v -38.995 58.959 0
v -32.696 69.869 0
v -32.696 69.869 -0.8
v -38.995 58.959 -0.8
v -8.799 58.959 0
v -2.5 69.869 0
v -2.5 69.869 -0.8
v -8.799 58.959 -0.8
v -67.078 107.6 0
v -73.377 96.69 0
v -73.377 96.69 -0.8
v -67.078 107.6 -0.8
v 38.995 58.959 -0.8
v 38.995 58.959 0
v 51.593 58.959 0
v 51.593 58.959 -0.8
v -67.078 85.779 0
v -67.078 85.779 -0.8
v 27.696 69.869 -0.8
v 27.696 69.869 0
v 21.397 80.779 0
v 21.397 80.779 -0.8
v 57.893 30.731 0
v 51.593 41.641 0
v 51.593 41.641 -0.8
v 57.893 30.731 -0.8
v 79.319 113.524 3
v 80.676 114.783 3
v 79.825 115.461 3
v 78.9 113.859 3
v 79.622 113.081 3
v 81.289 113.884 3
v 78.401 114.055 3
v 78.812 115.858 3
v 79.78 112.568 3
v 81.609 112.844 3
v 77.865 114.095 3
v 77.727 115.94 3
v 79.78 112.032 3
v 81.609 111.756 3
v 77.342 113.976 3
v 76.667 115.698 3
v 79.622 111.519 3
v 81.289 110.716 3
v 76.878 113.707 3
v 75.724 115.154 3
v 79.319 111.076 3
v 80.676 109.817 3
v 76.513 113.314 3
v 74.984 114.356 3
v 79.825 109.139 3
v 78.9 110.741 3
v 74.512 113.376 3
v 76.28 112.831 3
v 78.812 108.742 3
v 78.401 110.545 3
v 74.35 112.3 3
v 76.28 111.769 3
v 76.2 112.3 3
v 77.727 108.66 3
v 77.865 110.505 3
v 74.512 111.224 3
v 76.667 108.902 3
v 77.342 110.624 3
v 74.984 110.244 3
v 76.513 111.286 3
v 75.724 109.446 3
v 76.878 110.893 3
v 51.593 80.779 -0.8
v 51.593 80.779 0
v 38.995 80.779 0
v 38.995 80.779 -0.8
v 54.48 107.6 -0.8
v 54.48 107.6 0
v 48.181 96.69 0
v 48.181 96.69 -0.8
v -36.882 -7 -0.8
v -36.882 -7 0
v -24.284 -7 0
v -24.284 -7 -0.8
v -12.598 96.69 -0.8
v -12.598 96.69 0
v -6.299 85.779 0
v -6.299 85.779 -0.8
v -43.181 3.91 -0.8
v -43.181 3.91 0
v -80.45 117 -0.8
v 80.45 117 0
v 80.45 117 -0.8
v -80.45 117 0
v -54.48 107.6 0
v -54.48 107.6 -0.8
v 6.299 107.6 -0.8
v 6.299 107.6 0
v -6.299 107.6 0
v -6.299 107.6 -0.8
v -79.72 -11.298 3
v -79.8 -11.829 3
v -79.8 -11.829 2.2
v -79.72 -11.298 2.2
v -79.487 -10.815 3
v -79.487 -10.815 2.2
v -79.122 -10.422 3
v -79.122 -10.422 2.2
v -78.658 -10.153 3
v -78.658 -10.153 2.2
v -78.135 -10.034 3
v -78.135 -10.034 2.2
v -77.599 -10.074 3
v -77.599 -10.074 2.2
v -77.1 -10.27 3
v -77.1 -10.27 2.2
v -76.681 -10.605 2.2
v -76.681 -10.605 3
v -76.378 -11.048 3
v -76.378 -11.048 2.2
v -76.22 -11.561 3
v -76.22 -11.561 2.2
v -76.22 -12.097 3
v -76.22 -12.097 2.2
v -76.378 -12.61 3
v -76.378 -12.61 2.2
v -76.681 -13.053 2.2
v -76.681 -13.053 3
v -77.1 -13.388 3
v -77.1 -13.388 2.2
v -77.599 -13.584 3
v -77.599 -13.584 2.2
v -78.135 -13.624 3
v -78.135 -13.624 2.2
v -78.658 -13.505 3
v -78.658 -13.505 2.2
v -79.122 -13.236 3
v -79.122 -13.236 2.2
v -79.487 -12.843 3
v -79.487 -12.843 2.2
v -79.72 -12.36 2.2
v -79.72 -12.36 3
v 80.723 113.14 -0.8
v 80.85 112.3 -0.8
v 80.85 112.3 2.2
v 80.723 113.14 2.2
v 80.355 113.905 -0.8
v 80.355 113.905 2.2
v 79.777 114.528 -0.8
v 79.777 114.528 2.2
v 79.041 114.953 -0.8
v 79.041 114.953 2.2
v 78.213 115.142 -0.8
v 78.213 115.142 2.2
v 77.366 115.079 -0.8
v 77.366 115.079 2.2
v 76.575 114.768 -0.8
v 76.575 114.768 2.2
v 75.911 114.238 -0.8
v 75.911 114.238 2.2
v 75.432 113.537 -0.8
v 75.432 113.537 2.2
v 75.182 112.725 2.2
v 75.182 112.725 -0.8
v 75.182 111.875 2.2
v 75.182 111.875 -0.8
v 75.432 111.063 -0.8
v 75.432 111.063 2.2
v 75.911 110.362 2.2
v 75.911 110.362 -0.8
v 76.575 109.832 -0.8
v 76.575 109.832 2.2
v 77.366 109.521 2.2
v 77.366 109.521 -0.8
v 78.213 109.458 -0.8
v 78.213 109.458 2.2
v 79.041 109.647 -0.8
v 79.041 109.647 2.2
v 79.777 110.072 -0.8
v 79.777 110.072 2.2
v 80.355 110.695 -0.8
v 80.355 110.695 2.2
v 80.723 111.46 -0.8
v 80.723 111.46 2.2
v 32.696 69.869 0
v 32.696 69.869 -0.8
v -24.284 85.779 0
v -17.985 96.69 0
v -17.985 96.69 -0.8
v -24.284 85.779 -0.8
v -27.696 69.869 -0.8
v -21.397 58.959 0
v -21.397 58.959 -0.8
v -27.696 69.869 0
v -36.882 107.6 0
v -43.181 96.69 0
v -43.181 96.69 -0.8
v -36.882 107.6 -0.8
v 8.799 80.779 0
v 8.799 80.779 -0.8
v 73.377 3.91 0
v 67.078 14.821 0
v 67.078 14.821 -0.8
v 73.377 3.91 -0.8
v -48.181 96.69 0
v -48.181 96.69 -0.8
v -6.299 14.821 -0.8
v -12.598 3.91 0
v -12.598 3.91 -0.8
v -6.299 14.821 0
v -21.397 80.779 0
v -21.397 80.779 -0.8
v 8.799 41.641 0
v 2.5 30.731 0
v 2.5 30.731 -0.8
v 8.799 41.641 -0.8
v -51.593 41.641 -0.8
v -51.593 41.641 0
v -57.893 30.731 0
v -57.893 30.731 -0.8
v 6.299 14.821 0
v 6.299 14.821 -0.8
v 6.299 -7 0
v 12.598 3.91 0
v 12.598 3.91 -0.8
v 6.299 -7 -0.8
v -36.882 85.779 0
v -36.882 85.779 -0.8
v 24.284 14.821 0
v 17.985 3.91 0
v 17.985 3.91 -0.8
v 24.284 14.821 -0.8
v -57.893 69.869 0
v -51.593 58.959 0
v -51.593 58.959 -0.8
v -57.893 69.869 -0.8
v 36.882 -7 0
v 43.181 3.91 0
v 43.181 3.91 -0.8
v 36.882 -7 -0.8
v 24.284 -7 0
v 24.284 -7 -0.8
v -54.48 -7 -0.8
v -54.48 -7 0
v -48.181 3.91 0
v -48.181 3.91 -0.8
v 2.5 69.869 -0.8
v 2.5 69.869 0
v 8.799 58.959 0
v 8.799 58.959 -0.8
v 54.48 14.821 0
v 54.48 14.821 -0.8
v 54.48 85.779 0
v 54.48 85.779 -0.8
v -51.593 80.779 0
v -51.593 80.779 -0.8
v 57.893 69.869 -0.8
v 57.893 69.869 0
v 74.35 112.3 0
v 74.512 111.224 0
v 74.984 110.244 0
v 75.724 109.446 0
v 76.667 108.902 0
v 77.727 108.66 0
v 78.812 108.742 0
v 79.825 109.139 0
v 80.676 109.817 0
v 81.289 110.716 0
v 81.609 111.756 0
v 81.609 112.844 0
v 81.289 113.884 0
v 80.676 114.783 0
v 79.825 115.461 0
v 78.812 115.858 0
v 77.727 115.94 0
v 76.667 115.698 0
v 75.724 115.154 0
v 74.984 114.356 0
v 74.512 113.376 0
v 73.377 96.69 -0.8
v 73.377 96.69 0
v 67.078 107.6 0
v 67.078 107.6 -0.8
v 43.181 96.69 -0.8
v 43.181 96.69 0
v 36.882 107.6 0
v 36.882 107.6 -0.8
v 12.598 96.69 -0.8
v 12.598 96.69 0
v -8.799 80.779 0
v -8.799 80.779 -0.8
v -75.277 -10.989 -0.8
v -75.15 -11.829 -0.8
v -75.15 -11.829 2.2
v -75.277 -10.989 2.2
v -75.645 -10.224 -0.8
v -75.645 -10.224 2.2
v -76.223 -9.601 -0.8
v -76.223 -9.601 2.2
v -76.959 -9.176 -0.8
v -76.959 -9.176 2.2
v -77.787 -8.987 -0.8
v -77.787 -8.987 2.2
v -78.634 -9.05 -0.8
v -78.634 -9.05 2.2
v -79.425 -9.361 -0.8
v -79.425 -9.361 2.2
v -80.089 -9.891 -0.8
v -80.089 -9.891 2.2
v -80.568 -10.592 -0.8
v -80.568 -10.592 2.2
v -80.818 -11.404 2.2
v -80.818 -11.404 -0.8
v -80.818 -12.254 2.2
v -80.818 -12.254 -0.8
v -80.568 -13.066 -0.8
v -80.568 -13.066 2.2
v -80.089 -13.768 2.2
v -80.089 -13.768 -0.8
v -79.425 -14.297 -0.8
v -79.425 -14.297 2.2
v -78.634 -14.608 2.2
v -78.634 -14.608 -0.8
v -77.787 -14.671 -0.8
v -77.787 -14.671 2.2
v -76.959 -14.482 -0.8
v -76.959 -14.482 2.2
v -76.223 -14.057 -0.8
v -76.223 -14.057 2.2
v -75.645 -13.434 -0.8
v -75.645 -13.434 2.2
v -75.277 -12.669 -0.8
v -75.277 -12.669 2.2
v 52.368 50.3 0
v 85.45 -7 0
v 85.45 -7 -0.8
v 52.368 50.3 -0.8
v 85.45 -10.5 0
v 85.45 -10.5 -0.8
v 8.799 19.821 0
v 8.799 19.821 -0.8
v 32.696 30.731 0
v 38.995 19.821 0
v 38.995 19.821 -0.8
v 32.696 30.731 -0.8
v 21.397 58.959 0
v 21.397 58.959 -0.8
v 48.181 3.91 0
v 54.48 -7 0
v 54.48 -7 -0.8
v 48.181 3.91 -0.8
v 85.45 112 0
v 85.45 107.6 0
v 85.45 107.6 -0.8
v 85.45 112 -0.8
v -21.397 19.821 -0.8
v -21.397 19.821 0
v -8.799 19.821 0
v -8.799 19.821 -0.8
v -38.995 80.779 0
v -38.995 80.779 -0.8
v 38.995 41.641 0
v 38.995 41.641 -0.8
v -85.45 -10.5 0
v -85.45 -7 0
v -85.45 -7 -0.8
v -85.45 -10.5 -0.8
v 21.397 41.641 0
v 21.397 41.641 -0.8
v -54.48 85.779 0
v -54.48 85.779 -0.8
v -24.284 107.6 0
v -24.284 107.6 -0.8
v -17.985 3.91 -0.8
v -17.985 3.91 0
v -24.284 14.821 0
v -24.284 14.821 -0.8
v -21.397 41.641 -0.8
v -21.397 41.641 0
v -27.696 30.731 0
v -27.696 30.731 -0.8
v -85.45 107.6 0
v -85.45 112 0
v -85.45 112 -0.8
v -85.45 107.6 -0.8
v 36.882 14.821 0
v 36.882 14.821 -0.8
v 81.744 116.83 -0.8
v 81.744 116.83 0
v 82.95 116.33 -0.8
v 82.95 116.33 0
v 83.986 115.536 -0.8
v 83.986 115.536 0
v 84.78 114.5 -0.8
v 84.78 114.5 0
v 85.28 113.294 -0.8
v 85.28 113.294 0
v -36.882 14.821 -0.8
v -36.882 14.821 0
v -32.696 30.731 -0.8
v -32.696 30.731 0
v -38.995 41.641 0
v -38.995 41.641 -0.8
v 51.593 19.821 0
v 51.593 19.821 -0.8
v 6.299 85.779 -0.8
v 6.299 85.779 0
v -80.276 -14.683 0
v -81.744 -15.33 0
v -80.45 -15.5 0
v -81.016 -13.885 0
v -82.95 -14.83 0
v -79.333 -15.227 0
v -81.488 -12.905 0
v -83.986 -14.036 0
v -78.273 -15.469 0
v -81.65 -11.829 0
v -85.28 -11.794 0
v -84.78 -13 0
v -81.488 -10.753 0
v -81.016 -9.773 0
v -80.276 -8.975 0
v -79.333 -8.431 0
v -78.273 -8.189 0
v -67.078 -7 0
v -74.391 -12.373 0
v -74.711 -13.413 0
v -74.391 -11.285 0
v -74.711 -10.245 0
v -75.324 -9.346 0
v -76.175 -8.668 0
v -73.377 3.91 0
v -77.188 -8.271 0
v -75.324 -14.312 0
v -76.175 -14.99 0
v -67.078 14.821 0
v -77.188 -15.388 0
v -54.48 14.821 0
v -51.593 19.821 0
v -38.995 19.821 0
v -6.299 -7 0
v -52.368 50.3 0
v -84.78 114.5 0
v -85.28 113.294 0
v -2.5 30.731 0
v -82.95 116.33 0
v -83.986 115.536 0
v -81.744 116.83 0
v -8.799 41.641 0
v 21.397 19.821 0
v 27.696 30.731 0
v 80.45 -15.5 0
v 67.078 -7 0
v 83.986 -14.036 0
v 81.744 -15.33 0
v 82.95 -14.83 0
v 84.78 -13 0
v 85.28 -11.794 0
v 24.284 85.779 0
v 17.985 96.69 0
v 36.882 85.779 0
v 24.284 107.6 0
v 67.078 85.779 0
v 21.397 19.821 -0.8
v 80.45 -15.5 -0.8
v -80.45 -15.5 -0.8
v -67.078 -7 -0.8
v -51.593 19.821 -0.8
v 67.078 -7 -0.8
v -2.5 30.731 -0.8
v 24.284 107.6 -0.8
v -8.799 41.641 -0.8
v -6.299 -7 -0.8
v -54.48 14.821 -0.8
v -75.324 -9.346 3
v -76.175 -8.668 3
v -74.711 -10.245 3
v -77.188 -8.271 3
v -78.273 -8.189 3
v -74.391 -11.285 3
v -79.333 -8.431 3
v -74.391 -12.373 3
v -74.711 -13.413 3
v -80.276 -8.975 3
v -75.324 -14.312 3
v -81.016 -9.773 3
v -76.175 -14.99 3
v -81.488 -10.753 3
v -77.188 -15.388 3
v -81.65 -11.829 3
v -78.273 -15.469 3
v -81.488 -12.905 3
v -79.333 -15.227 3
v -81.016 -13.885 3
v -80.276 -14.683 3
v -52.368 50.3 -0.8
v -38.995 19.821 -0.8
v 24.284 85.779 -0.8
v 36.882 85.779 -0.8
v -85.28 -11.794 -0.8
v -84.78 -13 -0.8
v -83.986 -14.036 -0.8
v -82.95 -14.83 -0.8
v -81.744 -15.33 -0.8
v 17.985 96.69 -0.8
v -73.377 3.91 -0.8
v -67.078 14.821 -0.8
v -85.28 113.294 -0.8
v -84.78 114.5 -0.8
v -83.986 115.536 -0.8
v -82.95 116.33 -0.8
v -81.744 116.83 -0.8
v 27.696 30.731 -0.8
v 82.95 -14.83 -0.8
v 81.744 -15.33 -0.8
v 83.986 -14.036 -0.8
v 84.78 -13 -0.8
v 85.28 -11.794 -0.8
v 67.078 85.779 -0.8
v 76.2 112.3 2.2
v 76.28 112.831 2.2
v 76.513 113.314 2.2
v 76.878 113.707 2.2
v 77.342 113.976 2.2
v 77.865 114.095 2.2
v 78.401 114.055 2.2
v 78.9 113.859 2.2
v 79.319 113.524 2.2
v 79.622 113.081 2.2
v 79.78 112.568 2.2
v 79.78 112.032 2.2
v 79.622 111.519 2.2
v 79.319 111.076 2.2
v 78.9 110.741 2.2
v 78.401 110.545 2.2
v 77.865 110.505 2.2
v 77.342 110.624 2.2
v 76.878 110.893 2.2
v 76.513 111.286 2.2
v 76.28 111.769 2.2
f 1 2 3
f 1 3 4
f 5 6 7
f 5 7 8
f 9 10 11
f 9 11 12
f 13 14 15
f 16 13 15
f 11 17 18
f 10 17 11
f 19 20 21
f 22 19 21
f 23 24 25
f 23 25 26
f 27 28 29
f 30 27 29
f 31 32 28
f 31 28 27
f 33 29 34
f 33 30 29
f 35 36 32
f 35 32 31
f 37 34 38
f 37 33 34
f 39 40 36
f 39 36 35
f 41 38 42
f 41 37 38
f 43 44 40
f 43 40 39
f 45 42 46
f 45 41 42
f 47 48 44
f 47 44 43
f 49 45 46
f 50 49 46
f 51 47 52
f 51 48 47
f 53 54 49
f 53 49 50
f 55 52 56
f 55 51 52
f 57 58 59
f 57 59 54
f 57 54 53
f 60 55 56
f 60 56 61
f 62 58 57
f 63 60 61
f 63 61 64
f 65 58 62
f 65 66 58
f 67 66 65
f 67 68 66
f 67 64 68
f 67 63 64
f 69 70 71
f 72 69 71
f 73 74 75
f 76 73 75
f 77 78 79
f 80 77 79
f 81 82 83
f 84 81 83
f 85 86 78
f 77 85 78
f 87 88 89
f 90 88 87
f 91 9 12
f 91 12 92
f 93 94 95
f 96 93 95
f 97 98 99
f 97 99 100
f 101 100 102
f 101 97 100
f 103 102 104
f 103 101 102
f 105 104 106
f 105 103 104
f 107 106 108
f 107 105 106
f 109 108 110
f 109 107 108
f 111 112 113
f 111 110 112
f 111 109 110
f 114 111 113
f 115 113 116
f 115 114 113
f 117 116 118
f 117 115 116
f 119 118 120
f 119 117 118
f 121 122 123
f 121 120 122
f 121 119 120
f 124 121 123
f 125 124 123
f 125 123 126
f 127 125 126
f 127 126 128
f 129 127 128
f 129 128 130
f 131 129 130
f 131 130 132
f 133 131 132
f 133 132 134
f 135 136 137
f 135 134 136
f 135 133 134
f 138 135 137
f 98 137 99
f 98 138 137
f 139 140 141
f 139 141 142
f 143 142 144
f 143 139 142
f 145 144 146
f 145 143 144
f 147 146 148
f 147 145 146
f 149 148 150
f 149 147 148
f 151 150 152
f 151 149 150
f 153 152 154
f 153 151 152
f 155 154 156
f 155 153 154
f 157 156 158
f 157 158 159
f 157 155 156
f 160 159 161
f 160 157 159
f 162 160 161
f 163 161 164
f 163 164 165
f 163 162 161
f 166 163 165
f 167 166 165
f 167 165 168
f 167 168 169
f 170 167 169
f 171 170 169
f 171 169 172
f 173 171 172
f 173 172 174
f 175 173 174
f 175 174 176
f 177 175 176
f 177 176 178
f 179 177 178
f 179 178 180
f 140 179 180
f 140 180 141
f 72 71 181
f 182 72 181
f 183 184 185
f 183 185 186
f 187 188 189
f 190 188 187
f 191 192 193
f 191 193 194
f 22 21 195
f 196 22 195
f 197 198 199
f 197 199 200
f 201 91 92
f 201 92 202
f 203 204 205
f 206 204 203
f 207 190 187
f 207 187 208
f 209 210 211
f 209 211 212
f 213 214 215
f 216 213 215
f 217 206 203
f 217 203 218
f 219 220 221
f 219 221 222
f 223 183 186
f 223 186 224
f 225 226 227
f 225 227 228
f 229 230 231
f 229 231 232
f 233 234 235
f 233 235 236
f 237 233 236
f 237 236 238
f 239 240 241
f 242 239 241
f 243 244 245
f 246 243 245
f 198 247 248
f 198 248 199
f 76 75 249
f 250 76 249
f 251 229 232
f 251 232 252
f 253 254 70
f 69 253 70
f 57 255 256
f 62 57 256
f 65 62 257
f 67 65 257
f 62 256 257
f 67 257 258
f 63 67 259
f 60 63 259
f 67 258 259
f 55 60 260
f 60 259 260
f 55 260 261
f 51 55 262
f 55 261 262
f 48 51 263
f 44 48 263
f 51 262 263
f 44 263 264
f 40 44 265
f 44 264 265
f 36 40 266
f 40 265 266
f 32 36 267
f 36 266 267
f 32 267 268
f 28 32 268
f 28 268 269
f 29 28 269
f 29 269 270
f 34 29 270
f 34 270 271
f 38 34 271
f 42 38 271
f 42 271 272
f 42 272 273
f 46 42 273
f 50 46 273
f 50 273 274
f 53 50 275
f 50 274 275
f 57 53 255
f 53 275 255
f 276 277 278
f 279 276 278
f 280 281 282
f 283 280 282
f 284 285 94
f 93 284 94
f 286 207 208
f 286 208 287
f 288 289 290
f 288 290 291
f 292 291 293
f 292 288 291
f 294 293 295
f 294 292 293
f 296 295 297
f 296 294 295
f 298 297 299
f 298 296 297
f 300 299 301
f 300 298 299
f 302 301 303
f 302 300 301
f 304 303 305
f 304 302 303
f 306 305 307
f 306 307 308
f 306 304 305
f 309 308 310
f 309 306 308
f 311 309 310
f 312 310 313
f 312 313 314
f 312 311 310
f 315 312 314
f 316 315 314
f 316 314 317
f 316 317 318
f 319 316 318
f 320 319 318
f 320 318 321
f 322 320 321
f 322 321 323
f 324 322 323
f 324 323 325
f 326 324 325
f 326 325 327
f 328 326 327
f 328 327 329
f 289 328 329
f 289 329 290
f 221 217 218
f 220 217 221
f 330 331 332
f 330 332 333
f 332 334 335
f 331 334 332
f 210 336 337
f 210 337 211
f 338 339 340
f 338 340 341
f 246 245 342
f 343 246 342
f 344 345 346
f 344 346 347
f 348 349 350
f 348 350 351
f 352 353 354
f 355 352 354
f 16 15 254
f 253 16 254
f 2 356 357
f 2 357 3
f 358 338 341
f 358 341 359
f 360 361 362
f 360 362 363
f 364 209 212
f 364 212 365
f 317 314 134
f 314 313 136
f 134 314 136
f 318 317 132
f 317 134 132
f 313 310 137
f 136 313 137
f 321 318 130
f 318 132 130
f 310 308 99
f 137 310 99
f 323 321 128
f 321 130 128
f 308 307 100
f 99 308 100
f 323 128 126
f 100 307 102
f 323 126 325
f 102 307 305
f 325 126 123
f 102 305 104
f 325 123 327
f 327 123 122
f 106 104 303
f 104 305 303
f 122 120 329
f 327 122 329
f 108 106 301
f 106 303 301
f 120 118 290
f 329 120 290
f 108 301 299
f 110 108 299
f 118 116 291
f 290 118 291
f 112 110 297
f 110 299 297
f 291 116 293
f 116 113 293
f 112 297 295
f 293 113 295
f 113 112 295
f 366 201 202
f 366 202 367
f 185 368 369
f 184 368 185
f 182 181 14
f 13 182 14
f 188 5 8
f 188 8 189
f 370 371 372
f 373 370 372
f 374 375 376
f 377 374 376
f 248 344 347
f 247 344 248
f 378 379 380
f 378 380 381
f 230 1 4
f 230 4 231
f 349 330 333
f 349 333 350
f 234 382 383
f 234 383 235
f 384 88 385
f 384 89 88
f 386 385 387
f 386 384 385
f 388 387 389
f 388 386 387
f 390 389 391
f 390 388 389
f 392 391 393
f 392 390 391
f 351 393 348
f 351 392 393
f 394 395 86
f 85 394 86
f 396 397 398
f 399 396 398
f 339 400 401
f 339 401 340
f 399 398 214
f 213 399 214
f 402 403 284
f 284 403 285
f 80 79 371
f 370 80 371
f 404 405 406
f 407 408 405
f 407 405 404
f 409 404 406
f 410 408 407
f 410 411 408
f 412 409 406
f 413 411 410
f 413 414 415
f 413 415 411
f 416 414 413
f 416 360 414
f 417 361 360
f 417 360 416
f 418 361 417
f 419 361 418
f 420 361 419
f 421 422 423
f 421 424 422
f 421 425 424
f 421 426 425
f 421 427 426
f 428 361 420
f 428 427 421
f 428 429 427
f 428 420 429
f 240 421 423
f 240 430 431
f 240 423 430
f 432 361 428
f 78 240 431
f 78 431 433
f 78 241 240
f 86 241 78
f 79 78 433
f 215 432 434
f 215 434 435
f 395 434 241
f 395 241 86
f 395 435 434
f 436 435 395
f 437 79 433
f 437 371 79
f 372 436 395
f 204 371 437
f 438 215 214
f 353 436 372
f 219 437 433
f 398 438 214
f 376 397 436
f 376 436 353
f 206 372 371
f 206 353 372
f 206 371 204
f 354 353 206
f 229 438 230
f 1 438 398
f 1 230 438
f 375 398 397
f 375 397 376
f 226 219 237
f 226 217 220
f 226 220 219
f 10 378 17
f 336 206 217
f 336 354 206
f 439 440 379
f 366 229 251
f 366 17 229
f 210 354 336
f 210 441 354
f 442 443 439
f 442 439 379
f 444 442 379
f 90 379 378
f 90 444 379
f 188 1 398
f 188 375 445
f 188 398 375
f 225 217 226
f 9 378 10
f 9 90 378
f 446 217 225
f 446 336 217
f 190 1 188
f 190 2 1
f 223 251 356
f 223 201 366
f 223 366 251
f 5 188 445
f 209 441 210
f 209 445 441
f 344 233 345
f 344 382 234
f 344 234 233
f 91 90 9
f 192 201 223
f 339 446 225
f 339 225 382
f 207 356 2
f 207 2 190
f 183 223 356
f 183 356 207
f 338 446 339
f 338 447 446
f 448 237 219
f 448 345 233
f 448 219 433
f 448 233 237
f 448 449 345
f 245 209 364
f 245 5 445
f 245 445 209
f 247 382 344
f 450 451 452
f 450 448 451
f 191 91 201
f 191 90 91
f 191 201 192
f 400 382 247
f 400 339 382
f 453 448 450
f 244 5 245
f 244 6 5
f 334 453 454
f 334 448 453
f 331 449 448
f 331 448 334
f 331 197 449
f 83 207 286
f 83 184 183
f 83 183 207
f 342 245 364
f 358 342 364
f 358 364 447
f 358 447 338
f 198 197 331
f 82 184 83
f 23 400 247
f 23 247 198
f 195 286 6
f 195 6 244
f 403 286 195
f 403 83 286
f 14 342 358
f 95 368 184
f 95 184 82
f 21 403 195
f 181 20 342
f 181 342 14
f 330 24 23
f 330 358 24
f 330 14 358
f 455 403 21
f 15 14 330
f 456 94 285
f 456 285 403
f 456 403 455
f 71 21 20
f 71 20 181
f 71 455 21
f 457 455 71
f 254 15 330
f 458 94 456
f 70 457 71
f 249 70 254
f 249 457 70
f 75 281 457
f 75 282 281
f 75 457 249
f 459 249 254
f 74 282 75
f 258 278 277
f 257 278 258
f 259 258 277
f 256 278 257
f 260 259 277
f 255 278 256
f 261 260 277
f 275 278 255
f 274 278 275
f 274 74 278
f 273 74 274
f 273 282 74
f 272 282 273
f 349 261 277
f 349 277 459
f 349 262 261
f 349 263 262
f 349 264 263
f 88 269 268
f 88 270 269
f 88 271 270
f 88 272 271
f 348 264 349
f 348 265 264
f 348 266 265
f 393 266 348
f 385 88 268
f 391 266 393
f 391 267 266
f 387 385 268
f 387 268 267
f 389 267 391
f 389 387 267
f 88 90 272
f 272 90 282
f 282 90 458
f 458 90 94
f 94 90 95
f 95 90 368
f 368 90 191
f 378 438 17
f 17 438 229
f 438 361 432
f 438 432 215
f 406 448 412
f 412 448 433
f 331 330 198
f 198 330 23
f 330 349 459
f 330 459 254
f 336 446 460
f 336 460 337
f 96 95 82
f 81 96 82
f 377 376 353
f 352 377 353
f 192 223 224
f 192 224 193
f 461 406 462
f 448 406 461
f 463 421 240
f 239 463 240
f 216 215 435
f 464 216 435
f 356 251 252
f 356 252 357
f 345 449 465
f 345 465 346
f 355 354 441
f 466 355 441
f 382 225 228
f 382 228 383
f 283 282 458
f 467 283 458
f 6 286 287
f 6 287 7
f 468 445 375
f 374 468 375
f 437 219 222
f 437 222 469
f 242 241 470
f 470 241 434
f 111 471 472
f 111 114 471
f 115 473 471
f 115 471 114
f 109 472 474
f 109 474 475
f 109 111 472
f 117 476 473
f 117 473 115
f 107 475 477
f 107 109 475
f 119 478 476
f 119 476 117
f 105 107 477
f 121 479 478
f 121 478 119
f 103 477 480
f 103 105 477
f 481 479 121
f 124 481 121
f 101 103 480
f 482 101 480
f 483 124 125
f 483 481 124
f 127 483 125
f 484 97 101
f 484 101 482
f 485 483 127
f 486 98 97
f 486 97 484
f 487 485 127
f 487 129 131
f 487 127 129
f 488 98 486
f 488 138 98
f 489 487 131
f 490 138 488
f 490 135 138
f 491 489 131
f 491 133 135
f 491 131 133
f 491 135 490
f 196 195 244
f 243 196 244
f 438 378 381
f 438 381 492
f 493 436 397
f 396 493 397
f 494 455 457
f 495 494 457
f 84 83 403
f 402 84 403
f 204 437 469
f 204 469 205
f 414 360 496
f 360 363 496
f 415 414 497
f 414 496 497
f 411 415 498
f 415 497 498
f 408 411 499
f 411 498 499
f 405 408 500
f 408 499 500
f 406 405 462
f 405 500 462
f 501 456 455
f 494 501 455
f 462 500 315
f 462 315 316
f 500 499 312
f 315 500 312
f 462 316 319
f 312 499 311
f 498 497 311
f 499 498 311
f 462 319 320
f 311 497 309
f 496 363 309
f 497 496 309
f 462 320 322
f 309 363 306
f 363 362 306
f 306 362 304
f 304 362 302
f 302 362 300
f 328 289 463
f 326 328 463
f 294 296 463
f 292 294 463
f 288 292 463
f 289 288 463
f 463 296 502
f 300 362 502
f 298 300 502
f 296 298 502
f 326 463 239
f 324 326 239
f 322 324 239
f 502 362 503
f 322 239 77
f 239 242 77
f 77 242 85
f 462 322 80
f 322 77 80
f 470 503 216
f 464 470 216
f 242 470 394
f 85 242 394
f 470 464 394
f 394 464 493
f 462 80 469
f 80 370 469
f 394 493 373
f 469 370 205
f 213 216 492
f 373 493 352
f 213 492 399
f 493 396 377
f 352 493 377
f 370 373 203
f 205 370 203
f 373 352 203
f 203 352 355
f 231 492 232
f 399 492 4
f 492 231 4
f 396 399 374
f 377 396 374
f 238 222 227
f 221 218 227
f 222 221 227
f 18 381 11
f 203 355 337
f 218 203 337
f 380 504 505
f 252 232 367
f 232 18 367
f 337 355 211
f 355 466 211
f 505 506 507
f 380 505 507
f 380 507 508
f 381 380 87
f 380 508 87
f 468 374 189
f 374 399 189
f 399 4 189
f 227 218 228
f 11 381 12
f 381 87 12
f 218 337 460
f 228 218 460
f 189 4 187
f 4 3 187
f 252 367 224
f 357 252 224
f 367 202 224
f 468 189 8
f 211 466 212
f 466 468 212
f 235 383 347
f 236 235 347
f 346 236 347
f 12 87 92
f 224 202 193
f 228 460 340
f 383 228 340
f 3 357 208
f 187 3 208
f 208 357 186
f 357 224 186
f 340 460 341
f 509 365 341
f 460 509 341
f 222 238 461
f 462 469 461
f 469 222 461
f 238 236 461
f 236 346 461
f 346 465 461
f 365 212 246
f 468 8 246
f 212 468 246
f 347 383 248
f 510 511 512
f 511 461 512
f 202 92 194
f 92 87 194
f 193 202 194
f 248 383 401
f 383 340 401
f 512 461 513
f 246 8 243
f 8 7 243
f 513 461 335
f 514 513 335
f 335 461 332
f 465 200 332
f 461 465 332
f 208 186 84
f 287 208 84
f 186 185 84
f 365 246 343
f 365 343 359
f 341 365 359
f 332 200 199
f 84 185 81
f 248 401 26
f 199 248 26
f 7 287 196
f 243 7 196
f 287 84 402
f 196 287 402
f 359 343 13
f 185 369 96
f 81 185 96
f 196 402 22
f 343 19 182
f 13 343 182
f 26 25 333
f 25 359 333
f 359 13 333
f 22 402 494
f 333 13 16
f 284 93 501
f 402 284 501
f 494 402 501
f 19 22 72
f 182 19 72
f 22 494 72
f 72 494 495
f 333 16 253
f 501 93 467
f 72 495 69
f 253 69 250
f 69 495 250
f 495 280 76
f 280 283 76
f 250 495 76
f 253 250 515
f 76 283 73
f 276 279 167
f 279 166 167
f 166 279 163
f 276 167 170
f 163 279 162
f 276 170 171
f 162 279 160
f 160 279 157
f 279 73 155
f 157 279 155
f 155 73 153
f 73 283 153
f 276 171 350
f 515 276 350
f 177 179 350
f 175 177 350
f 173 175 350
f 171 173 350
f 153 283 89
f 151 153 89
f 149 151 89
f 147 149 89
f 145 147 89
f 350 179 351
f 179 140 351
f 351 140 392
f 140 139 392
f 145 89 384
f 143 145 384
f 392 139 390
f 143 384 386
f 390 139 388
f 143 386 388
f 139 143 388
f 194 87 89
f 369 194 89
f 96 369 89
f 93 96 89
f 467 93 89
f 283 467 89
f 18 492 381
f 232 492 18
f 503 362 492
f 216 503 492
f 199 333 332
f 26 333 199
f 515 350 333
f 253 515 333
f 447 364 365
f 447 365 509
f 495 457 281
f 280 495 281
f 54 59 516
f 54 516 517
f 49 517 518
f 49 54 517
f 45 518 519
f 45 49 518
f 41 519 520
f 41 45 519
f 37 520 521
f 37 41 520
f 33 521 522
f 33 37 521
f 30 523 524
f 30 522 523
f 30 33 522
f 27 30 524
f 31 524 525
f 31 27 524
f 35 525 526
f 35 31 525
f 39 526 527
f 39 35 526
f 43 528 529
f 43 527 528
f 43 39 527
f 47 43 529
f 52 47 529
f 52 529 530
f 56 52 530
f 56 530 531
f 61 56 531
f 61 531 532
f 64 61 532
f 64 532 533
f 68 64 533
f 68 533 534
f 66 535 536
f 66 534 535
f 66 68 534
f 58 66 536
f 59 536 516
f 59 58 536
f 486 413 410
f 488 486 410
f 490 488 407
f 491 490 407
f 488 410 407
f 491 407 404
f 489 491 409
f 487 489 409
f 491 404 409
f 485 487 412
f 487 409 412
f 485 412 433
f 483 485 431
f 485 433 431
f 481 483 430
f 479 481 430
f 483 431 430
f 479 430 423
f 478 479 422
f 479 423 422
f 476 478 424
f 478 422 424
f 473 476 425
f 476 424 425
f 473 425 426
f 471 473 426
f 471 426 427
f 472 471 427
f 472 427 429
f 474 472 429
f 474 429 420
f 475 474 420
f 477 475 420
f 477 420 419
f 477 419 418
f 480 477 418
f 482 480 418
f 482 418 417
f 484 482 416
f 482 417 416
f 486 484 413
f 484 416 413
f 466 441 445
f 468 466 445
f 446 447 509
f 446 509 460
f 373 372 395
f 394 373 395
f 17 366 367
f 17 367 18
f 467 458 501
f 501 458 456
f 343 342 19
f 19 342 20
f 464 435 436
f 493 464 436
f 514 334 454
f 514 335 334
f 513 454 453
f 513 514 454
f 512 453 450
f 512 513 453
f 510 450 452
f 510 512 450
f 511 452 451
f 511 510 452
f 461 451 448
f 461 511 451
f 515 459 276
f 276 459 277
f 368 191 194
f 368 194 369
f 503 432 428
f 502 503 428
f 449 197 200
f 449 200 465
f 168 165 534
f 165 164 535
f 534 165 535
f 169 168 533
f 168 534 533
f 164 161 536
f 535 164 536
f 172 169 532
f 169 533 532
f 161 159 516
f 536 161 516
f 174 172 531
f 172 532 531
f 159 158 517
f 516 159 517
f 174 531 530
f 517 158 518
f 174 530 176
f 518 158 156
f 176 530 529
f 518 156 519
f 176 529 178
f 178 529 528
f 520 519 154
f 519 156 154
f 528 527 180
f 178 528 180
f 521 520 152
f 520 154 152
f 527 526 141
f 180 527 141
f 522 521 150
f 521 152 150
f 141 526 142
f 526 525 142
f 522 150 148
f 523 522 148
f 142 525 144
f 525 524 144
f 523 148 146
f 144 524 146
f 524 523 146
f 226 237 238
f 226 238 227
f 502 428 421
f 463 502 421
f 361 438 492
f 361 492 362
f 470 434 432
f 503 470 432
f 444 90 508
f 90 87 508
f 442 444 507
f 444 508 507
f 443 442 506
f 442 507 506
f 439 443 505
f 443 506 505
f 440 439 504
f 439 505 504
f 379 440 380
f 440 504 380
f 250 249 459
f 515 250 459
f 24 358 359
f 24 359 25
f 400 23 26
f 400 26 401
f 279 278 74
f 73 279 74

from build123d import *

# Parameters (mm, degrees)
BOSS_EXTRUDE1_DEPTH     = 0.8
CUT_EXTRUDE1_DEPTH      = 145.88389317
CUT_EXTRUDE2_DEPTH      = 145.88389317
MIRROR2_COPY_1_DEPTH    = 145.88389317
MIRROR2_COPY_2_DEPTH    = 145.88389317
FILLET1_R               = 5
SKETCH4_R               = 3.65
BOSS_EXTRUDE4_DEPTH     = 3
CUT_EXTRUDE5_DEPTH      = 145.931509686
CUT_EXTRUDE5_DEPTH_BACK = 145.931509686
SKETCH2_4_R             = 1.8
CUT_EXTRUDE6_DEPTH      = 2.2
CUT_EXTRUDE6_DEPTH_BACK = 145.912740986
SKETCH4_4_R             = 2.85


with BuildPart() as part:
    # Sketch1 → Boss-Extrude1 (new body)
    with BuildSketch(Plane.XY):
        Polygon((85.45, 117), (-85.45, 117), (-85.45, 107.6), (-52.367829575, 50.3), (-85.45, -7), (-85.45, -15.5), (85.45, -15.5), (85.45, -7), (52.367829575, 50.3), (85.45, 107.6), align=None)
    extrude(amount=-BOSS_EXTRUDE1_DEPTH)

    # Sketch1<3> → Cut-Extrude1 (cut, through all)
    with BuildSketch(Plane.XY):
        Polygon((73.377429493, 96.689694505), (67.078361679, 107.6), (54.480226049, 107.6), (48.181158234, 96.689694505), (54.480226049, 85.779389009), (67.078361679, 85.779389009), align=None)
        Polygon((51.593474703, 80.779389009), (38.995339074, 80.779389009), (32.696271259, 69.869083514), (38.995339074, 58.958778018), (51.593474703, 58.958778018), (57.892542518, 69.869083514), align=None)
        Polygon((43.181158234, 96.689694505), (36.88209042, 107.6), (24.28395479, 107.6), (17.984886975, 96.689694505), (24.28395479, 85.779389009), (36.88209042, 85.779389009), align=None)
        Polygon((21.397203444, 80.779389009), (8.799067815, 80.779389009), (2.5, 69.869083514), (8.799067815, 58.958778018), (21.397203444, 58.958778018), (27.696271259, 69.869083514), align=None)
    cut_extrude1 = extrude(amount=-CUT_EXTRUDE1_DEPTH, mode=Mode.SUBTRACT)

    # Sketch1<4> → Cut-Extrude2 (cut, through all)
    with BuildSketch(Plane.XY):
        Polygon((-6.299067815, 107.6), (-12.598135629, 96.689694505), (-6.299067815, 85.779389009), (6.299067815, 85.779389009), (12.598135629, 96.689694505), (6.299067815, 107.6), align=None)
    cut_extrude2 = extrude(amount=-CUT_EXTRUDE2_DEPTH, mode=Mode.SUBTRACT)

    # Mirror1: Cut-Extrude1 across plane
    add(cut_extrude1.mirror(Plane(origin=(0, 0, 0), x_dir=(0, 0, 1), z_dir=(1, 0, 0))), mode=Mode.SUBTRACT)

    # Mirror2: Cut-Extrude2 across plane
    add(cut_extrude2.mirror(Plane(origin=(0, 50.3, 0), x_dir=(0, 0, 1), z_dir=(0, -1, 0))), mode=Mode.SUBTRACT)

    # Mirror2 copy 1 sketch → Mirror2 copy 1 (cut, through all)
    with BuildSketch(Plane(origin=(0, 100.6, 0), x_dir=(-1, 0, 0), z_dir=(0, 0, 1))):
        Polygon((73.377429493, 96.689694505), (67.078361679, 107.6), (54.480226049, 107.6), (48.181158234, 96.689694505), (54.480226049, 85.779389009), (67.078361679, 85.779389009), align=None)
        Polygon((51.593474703, 80.779389009), (38.995339074, 80.779389009), (32.696271259, 69.869083514), (38.995339074, 58.958778018), (51.593474703, 58.958778018), (57.892542518, 69.869083514), align=None)
        Polygon((43.181158234, 96.689694505), (36.88209042, 107.6), (24.28395479, 107.6), (17.984886975, 96.689694505), (24.28395479, 85.779389009), (36.88209042, 85.779389009), align=None)
        Polygon((21.397203444, 80.779389009), (8.799067815, 80.779389009), (2.5, 69.869083514), (8.799067815, 58.958778018), (21.397203444, 58.958778018), (27.696271259, 69.869083514), align=None)
    extrude(amount=-MIRROR2_COPY_1_DEPTH, mode=Mode.SUBTRACT)

    # Mirror2 copy 2 sketch → Mirror2 copy 2 (cut, through all)
    with BuildSketch(Plane(origin=(0, 100.6, 0), x_dir=(1, 0, 0), z_dir=(0, 0, 1))):
        Polygon((73.377429493, -96.689694505), (67.078361679, -107.6), (54.480226049, -107.6), (48.181158234, -96.689694505), (54.480226049, -85.779389009), (67.078361679, -85.779389009), align=None)
        Polygon((51.593474703, -80.779389009), (38.995339074, -80.779389009), (32.696271259, -69.869083514), (38.995339074, -58.958778018), (51.593474703, -58.958778018), (57.892542518, -69.869083514), align=None)
        Polygon((43.181158234, -96.689694505), (36.88209042, -107.6), (24.28395479, -107.6), (17.984886975, -96.689694505), (24.28395479, -85.779389009), (36.88209042, -85.779389009), align=None)
        Polygon((21.397203444, -80.779389009), (8.799067815, -80.779389009), (2.5, -69.869083514), (8.799067815, -58.958778018), (21.397203444, -58.958778018), (27.696271259, -69.869083514), align=None)
    extrude(amount=-MIRROR2_COPY_2_DEPTH, mode=Mode.SUBTRACT)

    # Fillet1
    fillet1_edges = [part.edges().sort_by_distance(p)[0] for p in [
        (85.45, -15.5, -0.4),
        (-85.45, -15.5, -0.4),
        (-85.45, 117, -0.4),
        (85.45, 117, -0.4),
    ]]
    fillet(fillet1_edges, radius=FILLET1_R)

    # Sketch4 → Boss-Extrude4 (add)
    with BuildSketch(Plane.XY):
        with Locations((-78, -11.829016319)):
            Circle(SKETCH4_R)
        with Locations((78, 112.3)):
            Circle(SKETCH4_R)
    extrude(amount=BOSS_EXTRUDE4_DEPTH)

    # Sketch2<4> → Cut-Extrude5 (cut, two sides: drawn at the far end of the back side and taken through both)
    with BuildSketch(Plane(origin=(0, 0, -0.8), x_dir=(-1, 0, 0), z_dir=(0, 0, -1)).offset(-CUT_EXTRUDE5_DEPTH_BACK)):
        with Locations((-78, 112.3)):
            Circle(SKETCH2_4_R)
        with Locations((78, -11.829016319)):
            Circle(SKETCH2_4_R)
    extrude(amount=CUT_EXTRUDE5_DEPTH + CUT_EXTRUDE5_DEPTH_BACK, mode=Mode.SUBTRACT)

    # Sketch4<4> → Cut-Extrude6 (cut, two sides: drawn at the far end of the back side and taken through both)
    with BuildSketch(Plane.XY.offset(-CUT_EXTRUDE6_DEPTH_BACK)):
        with Locations((-78, -11.829016319)):
            Circle(SKETCH4_4_R)
        with Locations((78, 112.3)):
            Circle(SKETCH4_4_R)
    extrude(amount=CUT_EXTRUDE6_DEPTH + CUT_EXTRUDE6_DEPTH_BACK, mode=Mode.SUBTRACT)


solid = part.part
